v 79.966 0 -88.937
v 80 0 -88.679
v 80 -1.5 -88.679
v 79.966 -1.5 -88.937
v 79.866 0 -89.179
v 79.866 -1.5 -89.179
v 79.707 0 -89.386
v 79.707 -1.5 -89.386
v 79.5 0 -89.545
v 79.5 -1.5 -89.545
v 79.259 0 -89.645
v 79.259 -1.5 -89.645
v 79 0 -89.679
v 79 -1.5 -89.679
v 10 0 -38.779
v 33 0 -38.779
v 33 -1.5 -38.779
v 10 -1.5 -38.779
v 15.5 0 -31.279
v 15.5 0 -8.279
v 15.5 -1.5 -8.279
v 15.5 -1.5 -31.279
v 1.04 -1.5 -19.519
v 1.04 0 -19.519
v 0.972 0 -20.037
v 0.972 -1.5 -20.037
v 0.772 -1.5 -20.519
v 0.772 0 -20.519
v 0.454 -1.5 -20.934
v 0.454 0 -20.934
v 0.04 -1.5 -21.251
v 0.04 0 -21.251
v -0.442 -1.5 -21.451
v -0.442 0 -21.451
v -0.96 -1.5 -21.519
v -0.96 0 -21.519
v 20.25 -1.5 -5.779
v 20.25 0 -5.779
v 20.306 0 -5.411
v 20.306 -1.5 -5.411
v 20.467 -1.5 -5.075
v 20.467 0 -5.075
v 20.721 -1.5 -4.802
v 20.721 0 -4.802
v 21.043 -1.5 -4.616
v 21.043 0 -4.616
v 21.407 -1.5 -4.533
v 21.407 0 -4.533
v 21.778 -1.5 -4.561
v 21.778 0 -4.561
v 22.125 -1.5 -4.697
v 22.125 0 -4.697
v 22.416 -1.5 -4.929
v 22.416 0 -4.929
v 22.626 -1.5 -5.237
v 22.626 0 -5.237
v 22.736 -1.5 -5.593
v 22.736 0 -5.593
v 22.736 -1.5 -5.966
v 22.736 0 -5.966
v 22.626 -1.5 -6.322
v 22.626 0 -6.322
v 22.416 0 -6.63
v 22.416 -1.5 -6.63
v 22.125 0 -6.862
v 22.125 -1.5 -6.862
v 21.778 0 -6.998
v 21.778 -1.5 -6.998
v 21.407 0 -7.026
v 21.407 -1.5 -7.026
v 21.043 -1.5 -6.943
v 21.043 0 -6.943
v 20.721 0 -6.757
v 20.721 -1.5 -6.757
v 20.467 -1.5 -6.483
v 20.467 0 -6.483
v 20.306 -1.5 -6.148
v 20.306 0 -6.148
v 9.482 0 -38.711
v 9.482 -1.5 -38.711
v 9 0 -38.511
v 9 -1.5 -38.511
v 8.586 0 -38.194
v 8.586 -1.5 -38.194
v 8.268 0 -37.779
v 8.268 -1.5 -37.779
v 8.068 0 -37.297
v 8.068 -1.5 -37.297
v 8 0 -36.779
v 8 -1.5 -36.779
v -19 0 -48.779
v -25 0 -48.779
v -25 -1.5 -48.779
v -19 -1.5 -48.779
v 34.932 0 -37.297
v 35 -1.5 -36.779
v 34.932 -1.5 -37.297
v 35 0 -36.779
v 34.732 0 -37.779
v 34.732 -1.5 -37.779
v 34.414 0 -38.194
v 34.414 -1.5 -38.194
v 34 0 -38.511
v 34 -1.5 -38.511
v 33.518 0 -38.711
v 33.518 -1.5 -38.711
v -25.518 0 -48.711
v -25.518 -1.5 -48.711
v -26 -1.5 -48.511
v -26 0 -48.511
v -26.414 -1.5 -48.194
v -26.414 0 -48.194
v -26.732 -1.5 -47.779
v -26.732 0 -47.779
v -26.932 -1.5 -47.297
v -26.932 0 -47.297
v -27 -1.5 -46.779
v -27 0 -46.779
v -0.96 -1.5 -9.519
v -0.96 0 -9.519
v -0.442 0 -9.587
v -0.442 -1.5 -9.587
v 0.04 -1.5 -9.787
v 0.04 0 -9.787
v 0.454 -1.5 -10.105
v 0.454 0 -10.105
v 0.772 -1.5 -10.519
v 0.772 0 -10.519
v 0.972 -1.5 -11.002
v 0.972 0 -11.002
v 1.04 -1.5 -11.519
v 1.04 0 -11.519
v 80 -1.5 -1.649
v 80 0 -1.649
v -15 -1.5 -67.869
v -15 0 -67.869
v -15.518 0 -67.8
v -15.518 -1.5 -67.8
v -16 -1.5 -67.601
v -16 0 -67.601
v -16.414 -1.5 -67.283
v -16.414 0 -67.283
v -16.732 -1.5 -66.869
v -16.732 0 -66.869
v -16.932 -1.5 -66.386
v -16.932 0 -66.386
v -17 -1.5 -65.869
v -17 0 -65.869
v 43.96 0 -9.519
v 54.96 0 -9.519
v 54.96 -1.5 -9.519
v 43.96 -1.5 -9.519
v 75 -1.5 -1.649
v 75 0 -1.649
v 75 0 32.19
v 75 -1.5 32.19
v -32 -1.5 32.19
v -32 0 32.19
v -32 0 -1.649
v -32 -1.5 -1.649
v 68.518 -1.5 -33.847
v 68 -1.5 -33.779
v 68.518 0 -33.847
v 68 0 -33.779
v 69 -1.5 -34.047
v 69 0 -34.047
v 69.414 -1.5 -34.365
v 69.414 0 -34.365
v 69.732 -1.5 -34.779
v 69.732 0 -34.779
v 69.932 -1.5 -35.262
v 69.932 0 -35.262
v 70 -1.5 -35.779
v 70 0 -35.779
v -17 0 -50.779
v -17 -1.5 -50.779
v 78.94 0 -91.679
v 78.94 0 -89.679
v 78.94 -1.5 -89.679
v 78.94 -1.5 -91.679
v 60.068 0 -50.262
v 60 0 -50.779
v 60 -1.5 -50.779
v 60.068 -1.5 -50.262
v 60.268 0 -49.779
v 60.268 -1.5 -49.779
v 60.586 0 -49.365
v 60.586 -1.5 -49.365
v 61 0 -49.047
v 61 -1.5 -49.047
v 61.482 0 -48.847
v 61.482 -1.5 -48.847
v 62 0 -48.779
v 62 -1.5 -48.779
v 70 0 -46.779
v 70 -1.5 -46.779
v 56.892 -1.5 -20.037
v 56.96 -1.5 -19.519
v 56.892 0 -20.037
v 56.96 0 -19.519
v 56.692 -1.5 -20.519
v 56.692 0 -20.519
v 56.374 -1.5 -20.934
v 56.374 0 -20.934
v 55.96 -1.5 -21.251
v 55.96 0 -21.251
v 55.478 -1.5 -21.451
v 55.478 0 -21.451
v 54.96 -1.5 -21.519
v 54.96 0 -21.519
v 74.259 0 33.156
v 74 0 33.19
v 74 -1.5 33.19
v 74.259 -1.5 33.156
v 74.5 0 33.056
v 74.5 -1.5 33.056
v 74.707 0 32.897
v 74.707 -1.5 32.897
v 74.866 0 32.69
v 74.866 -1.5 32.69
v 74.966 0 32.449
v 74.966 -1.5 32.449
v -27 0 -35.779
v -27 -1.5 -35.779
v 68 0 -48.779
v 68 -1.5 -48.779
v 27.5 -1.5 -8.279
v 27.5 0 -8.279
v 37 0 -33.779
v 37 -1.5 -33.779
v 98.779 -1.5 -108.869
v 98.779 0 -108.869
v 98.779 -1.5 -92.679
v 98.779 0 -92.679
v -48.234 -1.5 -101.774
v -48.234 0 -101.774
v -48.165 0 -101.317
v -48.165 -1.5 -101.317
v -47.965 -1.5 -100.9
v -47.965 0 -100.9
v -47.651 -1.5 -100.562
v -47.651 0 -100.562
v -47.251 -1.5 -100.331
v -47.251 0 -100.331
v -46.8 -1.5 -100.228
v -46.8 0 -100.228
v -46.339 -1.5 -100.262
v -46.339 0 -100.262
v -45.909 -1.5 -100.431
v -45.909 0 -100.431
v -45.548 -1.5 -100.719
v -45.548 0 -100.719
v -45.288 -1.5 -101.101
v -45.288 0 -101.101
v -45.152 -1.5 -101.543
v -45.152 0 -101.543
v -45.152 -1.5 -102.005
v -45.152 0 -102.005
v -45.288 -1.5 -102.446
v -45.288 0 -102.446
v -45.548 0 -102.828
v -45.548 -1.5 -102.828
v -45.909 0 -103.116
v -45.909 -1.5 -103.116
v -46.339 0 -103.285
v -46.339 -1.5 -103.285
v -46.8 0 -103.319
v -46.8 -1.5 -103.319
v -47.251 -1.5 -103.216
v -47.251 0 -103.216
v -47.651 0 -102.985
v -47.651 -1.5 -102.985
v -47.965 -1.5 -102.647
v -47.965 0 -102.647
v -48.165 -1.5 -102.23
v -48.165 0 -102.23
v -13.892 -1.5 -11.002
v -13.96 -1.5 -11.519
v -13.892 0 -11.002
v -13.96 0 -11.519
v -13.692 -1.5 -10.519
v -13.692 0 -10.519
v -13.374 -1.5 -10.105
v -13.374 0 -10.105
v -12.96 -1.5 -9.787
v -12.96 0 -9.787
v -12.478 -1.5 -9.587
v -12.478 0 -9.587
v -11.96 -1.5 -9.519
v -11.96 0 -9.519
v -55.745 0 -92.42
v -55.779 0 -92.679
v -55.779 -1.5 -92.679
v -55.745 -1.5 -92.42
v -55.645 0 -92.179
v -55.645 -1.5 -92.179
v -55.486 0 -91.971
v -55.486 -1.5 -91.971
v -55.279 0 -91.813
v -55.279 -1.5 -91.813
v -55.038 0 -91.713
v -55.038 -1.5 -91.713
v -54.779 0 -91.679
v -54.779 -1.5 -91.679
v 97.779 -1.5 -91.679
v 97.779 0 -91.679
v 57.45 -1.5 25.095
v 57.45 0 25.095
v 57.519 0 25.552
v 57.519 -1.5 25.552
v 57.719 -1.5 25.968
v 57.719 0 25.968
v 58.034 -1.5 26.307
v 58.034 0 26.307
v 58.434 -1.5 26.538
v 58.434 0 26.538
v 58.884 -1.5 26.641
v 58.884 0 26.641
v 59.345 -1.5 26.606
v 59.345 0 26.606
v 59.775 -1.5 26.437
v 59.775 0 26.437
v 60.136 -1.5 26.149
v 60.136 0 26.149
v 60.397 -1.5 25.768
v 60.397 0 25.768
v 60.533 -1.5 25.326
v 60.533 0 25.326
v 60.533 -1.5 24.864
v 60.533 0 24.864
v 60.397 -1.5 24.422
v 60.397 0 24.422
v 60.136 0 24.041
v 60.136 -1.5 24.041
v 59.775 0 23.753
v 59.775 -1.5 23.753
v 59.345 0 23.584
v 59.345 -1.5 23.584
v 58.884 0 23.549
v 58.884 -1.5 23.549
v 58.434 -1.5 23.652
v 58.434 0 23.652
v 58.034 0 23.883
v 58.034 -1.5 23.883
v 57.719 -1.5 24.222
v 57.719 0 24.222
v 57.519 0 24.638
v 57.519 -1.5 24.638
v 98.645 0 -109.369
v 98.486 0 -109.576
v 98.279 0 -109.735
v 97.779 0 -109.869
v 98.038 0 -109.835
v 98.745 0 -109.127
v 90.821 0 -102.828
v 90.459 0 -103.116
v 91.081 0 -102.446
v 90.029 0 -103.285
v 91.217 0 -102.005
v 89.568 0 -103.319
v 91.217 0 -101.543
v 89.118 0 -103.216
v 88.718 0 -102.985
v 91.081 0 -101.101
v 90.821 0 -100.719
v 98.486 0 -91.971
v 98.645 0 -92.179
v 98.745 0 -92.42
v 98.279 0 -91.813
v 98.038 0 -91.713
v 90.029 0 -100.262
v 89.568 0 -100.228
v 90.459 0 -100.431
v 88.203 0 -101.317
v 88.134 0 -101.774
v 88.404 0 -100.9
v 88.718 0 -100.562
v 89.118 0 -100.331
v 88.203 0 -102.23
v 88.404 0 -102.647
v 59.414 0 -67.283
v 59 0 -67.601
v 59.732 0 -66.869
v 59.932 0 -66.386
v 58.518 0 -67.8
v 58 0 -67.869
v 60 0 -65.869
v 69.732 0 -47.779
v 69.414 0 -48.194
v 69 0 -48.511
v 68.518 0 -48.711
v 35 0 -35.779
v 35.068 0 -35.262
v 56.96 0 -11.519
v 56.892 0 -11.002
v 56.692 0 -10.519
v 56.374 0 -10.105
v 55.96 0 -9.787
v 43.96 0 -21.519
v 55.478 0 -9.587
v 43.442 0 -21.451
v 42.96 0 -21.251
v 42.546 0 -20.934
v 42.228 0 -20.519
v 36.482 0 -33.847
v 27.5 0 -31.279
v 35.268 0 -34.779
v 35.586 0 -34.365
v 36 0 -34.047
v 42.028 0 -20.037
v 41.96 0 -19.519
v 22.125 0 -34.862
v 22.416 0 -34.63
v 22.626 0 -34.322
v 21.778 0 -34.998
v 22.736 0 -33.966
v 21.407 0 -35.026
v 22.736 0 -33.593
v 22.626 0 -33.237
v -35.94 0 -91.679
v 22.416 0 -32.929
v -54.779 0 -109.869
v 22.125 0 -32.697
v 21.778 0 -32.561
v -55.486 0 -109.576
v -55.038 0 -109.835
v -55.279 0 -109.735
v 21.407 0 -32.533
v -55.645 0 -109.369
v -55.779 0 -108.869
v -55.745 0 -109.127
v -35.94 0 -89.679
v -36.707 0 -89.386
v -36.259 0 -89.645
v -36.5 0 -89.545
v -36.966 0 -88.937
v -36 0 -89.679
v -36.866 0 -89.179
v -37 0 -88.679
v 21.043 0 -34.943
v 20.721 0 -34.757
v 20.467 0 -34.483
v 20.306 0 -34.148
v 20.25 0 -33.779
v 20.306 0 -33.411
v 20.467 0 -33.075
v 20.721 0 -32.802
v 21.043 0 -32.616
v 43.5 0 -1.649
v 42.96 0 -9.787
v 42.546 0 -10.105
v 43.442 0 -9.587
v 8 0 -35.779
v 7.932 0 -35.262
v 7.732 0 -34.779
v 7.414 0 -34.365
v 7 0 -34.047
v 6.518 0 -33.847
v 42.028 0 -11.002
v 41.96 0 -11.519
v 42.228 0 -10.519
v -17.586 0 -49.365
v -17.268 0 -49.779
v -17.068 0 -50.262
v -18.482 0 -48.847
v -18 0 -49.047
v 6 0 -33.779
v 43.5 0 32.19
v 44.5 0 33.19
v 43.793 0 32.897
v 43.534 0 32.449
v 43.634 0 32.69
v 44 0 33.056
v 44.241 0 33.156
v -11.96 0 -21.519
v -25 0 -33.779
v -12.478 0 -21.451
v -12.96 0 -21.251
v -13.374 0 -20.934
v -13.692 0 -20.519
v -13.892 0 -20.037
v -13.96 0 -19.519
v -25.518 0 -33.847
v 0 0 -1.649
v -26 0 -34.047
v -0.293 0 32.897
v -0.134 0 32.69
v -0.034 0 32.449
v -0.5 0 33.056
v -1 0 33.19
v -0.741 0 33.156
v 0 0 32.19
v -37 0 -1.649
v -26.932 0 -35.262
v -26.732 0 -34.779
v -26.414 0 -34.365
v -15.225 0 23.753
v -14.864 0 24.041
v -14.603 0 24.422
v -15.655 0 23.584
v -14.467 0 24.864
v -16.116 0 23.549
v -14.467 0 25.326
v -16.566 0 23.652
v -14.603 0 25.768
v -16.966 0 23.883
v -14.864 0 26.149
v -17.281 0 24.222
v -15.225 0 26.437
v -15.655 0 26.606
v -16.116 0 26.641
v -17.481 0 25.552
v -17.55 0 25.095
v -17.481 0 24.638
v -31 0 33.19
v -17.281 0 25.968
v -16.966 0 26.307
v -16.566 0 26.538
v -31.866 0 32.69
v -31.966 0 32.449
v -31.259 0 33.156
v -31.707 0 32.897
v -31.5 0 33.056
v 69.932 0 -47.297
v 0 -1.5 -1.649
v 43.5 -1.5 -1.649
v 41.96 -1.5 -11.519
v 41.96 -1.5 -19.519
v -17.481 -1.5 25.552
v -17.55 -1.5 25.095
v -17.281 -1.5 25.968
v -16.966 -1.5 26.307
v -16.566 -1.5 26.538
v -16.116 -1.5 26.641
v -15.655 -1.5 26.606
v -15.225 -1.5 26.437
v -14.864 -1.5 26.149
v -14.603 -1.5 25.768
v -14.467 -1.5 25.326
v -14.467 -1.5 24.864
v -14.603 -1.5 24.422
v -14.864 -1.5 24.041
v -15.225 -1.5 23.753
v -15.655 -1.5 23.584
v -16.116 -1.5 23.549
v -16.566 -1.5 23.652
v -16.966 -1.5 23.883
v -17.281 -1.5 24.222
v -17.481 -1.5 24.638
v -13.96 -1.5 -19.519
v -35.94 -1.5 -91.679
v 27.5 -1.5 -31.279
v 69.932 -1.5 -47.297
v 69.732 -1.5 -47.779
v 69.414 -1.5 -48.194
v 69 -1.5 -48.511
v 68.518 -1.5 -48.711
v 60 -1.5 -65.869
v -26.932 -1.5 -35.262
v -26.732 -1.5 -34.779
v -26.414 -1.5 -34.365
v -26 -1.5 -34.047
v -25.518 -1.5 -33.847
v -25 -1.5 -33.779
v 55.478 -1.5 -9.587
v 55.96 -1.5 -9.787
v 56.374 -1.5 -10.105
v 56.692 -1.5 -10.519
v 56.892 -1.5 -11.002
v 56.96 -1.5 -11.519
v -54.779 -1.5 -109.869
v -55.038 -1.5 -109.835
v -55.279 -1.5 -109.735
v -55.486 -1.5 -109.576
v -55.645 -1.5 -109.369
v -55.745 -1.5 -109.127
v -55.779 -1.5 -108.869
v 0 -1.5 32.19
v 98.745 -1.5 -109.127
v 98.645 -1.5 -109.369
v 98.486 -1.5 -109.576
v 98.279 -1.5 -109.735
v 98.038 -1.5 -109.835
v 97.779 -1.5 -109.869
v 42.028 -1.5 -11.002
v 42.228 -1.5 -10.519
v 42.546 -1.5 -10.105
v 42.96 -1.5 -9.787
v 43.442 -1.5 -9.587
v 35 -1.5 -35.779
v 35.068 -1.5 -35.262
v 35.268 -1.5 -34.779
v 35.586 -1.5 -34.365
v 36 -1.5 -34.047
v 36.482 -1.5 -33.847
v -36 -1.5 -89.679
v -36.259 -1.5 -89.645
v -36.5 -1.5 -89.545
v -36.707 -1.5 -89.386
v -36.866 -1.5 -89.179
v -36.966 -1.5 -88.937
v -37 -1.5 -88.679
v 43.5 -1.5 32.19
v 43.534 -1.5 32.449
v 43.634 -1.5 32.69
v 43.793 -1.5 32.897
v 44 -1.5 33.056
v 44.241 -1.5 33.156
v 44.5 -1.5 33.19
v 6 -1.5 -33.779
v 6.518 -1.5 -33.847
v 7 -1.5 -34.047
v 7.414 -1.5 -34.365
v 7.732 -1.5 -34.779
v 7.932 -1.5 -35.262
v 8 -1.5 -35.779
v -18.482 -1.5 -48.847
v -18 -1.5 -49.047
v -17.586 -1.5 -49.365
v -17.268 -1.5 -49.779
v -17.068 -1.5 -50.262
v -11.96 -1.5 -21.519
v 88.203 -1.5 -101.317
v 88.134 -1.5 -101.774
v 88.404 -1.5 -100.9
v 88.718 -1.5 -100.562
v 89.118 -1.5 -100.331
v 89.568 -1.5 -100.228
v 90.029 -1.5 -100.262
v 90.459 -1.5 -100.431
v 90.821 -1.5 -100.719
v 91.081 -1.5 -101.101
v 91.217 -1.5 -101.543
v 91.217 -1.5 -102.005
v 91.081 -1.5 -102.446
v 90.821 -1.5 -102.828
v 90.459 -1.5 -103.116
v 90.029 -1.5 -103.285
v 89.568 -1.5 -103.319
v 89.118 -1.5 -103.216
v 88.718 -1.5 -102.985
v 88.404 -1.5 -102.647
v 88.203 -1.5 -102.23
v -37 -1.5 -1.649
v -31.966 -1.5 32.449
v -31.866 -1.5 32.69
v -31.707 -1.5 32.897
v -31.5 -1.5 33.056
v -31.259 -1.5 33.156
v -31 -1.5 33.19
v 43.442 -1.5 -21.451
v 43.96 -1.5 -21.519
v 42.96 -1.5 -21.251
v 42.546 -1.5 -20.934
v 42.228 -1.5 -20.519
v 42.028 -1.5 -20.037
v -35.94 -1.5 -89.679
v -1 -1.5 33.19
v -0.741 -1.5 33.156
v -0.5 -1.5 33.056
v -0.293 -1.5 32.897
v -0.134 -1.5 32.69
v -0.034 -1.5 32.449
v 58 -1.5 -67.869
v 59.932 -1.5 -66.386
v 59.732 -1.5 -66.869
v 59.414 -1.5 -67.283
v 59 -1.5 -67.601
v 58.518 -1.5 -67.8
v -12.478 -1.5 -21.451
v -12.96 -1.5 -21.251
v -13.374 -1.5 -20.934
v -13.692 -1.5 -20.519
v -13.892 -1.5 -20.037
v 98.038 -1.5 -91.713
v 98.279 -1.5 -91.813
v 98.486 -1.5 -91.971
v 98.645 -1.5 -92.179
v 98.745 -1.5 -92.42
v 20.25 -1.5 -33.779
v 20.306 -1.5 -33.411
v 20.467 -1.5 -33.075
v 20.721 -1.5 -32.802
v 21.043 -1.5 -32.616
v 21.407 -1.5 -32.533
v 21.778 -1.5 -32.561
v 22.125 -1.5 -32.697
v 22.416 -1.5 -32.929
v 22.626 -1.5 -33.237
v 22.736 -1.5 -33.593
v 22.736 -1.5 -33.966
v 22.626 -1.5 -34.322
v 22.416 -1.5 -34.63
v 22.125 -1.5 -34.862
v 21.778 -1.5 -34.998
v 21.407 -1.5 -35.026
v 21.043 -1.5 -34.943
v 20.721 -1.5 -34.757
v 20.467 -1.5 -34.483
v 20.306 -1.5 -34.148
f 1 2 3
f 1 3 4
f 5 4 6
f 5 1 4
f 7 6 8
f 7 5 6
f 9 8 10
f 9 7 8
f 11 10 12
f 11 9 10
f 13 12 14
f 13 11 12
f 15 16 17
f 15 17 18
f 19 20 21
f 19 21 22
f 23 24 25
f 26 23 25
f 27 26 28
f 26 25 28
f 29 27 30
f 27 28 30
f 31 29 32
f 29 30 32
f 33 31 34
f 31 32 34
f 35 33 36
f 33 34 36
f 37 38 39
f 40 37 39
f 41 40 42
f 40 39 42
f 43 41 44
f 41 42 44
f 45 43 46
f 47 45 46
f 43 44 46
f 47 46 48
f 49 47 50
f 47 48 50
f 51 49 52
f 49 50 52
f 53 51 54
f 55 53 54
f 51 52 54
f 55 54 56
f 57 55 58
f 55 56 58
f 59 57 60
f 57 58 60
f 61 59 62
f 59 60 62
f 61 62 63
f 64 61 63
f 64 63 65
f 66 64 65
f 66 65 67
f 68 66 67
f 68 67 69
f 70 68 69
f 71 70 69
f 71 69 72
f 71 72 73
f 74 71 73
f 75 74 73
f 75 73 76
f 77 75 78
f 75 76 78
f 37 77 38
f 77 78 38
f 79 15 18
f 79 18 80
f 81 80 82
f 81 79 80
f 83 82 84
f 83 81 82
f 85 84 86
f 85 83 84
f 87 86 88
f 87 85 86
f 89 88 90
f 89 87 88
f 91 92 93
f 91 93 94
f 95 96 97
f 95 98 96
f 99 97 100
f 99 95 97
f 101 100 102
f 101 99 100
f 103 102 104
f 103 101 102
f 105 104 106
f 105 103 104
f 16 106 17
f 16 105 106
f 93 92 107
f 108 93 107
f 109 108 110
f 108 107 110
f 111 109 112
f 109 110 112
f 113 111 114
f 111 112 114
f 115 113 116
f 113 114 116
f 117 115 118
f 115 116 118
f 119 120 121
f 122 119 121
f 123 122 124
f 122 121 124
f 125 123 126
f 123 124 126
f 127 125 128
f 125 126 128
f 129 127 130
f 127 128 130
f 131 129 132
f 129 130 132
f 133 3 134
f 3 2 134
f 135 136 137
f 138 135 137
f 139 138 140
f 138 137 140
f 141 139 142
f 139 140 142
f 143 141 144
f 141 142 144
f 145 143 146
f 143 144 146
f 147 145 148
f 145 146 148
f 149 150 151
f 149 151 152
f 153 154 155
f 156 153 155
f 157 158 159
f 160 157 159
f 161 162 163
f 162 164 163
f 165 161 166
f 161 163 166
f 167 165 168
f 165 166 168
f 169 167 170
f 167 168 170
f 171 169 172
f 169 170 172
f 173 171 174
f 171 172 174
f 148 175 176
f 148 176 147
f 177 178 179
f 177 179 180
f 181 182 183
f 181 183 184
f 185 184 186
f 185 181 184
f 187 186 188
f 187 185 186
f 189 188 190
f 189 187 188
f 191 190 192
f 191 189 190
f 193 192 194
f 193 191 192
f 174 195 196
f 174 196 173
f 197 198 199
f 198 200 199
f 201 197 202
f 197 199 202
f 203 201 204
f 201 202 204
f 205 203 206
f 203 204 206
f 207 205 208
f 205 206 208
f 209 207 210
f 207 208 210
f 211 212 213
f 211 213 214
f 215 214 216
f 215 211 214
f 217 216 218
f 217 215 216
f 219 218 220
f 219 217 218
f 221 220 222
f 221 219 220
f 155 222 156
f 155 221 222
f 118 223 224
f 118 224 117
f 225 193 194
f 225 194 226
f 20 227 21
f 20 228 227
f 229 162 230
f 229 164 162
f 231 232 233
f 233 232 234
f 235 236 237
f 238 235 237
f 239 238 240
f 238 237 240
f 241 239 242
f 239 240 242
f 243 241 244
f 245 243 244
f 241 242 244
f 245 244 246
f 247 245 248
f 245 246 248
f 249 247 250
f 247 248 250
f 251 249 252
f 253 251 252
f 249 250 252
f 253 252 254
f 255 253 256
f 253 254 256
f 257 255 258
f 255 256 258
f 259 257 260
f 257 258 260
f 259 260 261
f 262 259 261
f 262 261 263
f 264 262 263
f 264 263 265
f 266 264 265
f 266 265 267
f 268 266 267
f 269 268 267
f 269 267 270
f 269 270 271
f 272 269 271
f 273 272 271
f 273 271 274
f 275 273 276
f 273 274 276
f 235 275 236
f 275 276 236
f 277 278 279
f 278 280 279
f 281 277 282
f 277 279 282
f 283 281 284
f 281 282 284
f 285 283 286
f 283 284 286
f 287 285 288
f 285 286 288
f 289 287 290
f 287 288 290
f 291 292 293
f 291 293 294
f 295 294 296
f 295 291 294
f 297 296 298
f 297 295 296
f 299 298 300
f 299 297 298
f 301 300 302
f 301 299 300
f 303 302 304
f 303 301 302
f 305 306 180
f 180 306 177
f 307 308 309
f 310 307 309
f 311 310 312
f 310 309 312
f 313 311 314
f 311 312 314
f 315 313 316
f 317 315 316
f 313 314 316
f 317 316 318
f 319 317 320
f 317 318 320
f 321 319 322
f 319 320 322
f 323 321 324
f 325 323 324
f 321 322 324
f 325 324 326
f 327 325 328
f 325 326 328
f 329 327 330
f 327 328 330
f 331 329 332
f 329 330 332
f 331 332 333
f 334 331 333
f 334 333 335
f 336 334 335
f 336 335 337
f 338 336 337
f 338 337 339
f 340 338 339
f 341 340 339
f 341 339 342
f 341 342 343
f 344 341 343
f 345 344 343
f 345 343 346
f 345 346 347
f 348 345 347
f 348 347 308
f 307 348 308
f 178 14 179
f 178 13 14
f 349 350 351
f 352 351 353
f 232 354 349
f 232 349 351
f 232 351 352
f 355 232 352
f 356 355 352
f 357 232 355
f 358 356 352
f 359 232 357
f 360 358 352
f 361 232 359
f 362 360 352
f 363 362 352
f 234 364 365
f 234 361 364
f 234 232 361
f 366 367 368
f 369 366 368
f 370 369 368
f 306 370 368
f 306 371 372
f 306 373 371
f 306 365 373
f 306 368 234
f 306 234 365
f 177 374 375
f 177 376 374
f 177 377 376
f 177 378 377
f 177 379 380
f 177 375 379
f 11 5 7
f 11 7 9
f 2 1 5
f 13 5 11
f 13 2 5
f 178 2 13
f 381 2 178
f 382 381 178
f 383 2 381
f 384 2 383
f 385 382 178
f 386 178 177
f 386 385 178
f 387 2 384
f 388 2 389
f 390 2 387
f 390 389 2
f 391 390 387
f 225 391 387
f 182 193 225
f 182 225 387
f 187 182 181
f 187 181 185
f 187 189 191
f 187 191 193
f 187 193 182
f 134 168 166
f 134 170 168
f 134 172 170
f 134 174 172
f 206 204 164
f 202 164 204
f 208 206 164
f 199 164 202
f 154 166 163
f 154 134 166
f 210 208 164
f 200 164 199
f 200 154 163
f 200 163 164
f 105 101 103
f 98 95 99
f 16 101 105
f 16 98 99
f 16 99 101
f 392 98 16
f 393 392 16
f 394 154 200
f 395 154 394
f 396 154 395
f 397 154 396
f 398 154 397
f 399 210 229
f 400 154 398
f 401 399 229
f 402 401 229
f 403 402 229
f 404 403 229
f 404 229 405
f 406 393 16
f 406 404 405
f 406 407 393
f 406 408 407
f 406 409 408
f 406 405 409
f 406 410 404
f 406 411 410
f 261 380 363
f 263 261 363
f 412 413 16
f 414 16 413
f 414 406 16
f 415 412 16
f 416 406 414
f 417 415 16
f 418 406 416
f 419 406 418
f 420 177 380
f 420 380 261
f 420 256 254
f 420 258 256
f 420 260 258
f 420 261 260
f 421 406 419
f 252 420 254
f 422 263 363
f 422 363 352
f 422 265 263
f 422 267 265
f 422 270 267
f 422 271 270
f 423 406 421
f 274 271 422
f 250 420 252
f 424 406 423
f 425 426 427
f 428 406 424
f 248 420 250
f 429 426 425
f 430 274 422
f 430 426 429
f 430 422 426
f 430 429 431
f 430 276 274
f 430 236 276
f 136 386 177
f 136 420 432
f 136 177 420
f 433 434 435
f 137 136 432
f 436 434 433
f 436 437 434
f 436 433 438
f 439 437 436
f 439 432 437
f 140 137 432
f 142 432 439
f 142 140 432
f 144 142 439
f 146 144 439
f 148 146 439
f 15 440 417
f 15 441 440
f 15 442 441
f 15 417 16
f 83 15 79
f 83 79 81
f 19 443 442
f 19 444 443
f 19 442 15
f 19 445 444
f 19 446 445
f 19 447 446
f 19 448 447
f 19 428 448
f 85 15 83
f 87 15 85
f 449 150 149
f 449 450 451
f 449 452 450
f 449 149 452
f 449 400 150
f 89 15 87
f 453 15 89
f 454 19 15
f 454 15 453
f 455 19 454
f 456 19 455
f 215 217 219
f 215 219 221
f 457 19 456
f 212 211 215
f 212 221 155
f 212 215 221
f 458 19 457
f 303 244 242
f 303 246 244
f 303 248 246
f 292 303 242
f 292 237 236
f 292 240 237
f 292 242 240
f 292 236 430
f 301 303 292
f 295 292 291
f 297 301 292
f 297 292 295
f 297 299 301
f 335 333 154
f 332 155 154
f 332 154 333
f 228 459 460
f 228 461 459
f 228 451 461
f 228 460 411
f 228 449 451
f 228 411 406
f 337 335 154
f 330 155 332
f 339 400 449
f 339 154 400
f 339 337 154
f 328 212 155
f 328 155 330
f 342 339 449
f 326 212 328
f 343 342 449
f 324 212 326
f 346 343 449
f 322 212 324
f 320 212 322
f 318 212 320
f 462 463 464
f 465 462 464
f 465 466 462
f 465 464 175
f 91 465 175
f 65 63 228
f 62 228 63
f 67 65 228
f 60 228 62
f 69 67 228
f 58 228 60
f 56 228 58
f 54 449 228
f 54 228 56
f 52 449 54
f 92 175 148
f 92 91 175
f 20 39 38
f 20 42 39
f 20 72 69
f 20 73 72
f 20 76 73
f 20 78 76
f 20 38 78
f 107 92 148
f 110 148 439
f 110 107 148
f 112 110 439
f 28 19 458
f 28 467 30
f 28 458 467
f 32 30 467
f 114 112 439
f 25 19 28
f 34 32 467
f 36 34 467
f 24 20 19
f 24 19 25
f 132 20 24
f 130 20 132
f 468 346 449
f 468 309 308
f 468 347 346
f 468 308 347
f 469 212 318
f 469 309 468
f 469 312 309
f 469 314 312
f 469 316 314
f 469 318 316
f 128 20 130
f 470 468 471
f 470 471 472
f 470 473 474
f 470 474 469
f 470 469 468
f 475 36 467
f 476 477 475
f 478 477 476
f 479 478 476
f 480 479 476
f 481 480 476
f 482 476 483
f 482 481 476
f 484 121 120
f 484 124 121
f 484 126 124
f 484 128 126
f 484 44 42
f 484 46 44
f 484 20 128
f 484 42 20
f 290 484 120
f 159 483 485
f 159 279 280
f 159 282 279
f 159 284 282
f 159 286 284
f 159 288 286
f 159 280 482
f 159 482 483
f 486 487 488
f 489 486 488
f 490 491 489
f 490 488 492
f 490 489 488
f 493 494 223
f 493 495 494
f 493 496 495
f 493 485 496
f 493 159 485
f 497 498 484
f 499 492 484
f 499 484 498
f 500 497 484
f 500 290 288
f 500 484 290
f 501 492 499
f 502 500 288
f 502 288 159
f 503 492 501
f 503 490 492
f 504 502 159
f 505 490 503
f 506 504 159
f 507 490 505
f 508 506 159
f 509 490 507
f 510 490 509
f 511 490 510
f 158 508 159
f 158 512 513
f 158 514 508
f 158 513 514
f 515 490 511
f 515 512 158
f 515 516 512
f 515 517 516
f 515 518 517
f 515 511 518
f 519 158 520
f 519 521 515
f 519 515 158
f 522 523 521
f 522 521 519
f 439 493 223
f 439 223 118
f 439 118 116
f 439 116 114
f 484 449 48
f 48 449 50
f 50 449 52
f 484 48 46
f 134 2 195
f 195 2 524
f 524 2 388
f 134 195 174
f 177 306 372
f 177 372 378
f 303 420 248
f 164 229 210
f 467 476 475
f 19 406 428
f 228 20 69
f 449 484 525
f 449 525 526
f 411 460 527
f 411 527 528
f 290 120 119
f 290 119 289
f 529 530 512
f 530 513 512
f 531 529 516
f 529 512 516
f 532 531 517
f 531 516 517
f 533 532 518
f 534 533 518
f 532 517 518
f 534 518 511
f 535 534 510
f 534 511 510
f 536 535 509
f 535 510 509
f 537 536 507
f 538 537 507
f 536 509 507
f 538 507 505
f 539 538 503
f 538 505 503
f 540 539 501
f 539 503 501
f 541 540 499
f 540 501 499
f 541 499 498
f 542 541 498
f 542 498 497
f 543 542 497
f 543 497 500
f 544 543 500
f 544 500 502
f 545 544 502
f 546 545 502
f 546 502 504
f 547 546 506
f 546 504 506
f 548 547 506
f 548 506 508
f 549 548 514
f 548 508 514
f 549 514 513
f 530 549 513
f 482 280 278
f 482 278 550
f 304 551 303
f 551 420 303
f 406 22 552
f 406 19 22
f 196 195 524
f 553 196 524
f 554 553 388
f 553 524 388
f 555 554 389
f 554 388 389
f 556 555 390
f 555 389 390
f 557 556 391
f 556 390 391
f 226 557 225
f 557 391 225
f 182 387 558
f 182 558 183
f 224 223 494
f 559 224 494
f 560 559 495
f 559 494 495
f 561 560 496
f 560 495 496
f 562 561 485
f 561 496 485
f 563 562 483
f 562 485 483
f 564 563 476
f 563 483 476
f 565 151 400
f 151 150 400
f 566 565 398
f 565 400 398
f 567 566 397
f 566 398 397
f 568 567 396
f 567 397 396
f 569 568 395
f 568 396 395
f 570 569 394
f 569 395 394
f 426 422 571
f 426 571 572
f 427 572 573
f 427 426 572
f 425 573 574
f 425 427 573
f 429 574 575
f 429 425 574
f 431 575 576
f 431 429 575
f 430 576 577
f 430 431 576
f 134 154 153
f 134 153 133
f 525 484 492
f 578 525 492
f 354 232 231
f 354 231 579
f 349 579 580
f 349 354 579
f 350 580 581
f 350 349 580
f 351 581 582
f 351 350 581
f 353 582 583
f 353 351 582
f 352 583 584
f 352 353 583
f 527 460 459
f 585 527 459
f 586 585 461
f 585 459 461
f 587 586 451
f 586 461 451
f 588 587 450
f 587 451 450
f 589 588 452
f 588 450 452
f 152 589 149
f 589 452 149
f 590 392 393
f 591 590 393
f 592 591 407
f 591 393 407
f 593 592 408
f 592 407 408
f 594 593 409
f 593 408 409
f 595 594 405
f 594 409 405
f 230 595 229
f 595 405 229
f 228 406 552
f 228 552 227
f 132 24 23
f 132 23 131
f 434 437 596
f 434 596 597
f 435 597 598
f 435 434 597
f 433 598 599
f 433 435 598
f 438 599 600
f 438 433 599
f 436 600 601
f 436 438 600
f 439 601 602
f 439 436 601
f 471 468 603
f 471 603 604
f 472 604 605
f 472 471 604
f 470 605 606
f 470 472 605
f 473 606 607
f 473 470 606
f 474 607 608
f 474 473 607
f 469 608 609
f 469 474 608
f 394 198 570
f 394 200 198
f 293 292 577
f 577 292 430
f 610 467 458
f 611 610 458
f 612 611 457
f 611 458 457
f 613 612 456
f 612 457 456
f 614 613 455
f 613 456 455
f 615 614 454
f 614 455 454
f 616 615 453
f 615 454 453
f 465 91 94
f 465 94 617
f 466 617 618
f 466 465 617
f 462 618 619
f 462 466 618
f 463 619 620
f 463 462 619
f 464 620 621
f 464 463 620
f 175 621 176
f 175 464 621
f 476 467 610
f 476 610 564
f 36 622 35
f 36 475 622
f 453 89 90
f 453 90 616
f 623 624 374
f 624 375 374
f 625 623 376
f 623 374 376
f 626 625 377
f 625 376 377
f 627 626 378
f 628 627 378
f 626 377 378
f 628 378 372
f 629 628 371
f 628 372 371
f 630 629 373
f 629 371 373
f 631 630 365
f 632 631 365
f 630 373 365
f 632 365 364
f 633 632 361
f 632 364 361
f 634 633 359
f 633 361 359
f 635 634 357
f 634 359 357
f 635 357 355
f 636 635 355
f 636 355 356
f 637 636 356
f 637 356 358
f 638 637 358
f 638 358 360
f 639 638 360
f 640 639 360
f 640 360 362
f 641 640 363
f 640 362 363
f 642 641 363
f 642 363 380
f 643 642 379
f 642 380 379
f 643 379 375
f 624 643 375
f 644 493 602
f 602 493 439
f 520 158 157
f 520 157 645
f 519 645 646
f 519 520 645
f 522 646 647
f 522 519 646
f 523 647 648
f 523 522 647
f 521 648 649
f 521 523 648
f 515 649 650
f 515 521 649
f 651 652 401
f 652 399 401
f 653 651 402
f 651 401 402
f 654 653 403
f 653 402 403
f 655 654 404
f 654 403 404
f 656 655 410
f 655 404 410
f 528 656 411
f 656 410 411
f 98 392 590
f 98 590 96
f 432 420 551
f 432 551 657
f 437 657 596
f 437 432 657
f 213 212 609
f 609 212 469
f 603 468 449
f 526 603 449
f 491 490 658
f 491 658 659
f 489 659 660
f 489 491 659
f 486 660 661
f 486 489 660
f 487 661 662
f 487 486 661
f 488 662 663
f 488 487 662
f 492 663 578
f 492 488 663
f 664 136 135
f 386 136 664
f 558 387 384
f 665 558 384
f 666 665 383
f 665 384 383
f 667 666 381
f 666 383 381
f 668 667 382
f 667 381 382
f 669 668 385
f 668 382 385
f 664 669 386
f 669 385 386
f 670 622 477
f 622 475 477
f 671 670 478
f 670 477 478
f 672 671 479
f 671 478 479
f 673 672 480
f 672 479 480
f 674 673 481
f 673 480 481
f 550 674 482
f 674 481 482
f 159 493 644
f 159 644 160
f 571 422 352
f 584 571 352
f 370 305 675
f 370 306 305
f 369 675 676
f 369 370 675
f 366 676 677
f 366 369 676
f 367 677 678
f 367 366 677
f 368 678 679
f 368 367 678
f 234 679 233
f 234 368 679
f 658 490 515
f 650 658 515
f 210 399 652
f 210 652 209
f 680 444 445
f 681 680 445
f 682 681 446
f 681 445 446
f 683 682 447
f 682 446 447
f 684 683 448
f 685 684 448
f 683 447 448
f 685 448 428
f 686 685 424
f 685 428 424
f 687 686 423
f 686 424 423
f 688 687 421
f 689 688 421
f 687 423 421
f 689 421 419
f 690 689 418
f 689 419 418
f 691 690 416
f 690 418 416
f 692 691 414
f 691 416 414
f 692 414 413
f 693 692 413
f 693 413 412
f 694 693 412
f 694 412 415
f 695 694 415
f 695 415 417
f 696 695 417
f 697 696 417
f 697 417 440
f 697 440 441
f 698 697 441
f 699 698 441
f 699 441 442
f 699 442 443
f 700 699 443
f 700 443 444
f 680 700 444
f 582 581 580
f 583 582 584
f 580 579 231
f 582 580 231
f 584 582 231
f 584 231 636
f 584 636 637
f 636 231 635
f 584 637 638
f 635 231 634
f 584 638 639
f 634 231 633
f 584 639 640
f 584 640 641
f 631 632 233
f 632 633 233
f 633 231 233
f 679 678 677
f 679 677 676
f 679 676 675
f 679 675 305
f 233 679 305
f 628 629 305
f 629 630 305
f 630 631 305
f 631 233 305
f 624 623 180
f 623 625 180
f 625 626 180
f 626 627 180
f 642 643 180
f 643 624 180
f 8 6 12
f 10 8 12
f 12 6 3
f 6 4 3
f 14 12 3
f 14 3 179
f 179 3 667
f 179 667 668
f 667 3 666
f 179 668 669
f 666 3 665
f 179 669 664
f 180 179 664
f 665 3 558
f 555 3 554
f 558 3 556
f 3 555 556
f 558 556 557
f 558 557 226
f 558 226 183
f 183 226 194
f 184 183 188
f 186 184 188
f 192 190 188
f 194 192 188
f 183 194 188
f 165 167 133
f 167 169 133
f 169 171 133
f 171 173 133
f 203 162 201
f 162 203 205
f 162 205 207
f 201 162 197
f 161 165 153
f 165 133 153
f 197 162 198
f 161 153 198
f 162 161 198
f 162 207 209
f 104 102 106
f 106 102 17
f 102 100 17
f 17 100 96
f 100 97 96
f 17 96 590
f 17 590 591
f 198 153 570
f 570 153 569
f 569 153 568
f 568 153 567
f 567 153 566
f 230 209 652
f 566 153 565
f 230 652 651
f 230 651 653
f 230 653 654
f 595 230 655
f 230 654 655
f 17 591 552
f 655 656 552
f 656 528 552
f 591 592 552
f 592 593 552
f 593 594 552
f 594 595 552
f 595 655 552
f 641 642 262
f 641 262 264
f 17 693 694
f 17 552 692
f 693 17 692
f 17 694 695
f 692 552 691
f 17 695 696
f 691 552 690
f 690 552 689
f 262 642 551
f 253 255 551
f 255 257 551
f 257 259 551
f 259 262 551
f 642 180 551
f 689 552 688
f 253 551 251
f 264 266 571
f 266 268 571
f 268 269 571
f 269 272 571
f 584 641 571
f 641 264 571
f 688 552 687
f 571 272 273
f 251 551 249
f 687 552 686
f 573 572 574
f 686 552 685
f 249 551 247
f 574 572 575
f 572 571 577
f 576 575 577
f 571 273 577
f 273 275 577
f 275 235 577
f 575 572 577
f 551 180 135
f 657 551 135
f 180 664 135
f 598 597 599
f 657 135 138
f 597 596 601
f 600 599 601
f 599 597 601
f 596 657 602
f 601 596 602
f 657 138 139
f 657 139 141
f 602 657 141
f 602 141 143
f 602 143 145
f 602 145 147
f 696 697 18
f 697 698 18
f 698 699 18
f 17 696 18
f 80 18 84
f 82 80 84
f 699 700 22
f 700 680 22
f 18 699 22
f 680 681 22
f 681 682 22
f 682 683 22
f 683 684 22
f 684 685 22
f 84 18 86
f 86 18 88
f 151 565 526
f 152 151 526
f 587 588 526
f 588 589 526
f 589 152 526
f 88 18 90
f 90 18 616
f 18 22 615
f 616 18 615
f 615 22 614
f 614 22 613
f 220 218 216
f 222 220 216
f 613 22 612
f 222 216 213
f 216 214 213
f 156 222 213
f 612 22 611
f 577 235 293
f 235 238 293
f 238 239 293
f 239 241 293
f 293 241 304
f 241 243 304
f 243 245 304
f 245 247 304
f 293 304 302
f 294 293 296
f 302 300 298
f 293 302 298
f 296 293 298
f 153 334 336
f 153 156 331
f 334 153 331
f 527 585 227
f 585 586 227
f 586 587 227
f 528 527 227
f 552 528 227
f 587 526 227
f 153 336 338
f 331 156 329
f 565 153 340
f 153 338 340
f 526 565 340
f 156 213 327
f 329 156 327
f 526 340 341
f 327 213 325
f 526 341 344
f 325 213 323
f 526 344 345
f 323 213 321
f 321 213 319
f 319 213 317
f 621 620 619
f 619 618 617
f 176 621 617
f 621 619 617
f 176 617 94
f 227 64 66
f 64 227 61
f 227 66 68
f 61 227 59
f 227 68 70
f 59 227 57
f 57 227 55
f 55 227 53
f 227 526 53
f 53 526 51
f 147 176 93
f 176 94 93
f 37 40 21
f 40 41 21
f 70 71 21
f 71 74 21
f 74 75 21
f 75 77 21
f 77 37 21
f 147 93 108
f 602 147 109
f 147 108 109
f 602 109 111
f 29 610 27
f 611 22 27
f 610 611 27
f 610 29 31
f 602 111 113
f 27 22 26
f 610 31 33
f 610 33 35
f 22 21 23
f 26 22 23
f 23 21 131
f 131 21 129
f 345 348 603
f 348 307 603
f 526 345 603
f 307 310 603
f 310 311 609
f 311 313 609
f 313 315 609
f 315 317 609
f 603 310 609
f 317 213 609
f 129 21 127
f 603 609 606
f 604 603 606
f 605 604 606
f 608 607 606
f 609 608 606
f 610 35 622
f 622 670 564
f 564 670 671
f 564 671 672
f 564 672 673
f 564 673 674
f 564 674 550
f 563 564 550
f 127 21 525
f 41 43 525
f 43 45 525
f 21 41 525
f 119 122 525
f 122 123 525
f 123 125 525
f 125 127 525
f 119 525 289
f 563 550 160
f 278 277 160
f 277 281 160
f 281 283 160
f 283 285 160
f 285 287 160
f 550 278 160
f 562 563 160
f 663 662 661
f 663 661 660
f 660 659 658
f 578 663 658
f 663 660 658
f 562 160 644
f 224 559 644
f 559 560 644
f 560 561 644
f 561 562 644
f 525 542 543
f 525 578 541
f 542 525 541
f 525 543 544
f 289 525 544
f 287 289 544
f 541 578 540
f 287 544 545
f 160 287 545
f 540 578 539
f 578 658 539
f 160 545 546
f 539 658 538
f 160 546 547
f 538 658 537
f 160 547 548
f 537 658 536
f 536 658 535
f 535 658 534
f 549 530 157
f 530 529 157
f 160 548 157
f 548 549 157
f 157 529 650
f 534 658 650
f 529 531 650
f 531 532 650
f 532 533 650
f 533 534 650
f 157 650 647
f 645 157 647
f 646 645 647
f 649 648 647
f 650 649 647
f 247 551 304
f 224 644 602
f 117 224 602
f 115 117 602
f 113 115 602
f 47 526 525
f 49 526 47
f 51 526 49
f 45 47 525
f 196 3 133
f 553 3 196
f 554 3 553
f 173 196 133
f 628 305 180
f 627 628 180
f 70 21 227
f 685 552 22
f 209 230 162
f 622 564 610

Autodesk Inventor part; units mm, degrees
ref_plane "YZ Plane" through (0, 0, 0) normal (1, 0, 0) x (0, 1, 0)
ref_plane "XZ Plane" through (0, 0, 0) normal (0, 1, 0) x (-1, 0, 0)
ref_plane "XY Plane" through (0, 0, 0) normal (0, 0, 1) x (1, 0, 0)
sketch "Sketch1" plane through (0, 0, 0) normal (0, 1, 0) x (-1, 0, 0)
  line L0 (32, -0.4496) -> (0, -0.4496)
  line L1 (-80.1396, -91.6786) -> (-80.1396, -109.8686)
  line L2 (37, -56.2289) -> (-80, -56.2289)
  line L3 (-43.5, -0.4496) -> (-75, -0.4496)
  line L4 (37.1396, -109.8686) -> (37.1396, -91.6786)
  arc A0 (-60, -65.8686) -> (-58, -67.8686) centre (-58, -65.8686) ccw
  line L5 (15, -67.8686) -> (-58, -67.8686)
  arc A1 (15, -67.8686) -> (17, -65.8686) centre (15, -65.8686) ccw
  line L6 (17, -50.7793) -> (17, -65.8686)
  arc A2 (27, -35.7793) -> (25, -33.7793) centre (25, -35.7793) ccw
  line L7 (-6, -33.7793) -> (25, -33.7793)
  arc A3 (-6, -33.7793) -> (-8, -35.7793) centre (-6, -35.7793) ccw
  line L8 (-8, -36.7793) -> (-8, -35.7793)
  arc A4 (-10, -38.7793) -> (-8, -36.7793) centre (-10, -36.7793) ccw
  arc A5 (-35, -36.7793) -> (-33, -38.7793) centre (-33, -36.7793) ccw
  line L9 (-35, -35.7793) -> (-35, -36.7793)
  arc A6 (-35, -35.7793) -> (-37, -33.7793) centre (-37, -35.7793) ccw
  line L10 (-68, -33.7793) -> (-37, -33.7793)
  arc A7 (-68, -33.7793) -> (-70, -35.7793) centre (-68, -35.7793) ccw
  line L11 (-70, -46.7793) -> (-70, -35.7793)
  line L12 (-27.5, -31.2793) -> (-27.5, -8.2793)
  line L13 (-15.5, -31.2793) -> (-27.5, -31.2793)
  line L14 (-15.5, -8.2793) -> (-15.5, -31.2793)
  line L15 (-27.5, -8.2793) -> (-15.5, -8.2793)
  circle A8 centre (-21.5, -5.7793) radius 1.25
  circle A9 centre (-21.5, -33.7793) radius 1.25
  arc A10 (-1.04, -19.5193) -> (0.96, -21.5193) centre (0.96, -19.5193) ccw
  line L16 (11.96, -21.5193) -> (0.96, -21.5193)
  arc A11 (0.96, -9.5193) -> (-1.04, -11.5193) centre (0.96, -11.5193) ccw
  line L17 (-1.04, -19.5193) -> (-1.04, -11.5193)
  arc A12 (11.96, -21.5193) -> (13.96, -19.5193) centre (11.96, -19.5193) ccw
  line L18 (13.96, -11.5193) -> (13.96, -19.5193)
  arc A13 (13.96, -11.5193) -> (11.96, -9.5193) centre (11.96, -11.5193) ccw
  line L19 (0.96, -9.5193) -> (11.96, -9.5193)
  arc A14 (-43.96, -21.5193) -> (-41.96, -19.5193) centre (-43.96, -19.5193) ccw
  line L20 (-41.96, -11.5193) -> (-41.96, -19.5193)
  arc A15 (-56.96, -19.5193) -> (-54.96, -21.5193) centre (-54.96, -19.5193) ccw
  line L21 (-43.96, -21.5193) -> (-54.96, -21.5193)
  arc A16 (-41.96, -11.5193) -> (-43.96, -9.5193) centre (-43.96, -11.5193) ccw
  line L22 (-54.96, -9.5193) -> (-43.96, -9.5193)
  arc A17 (-54.96, -9.5193) -> (-56.96, -11.5193) centre (-54.96, -11.5193) ccw
  line L23 (-56.96, -19.5193) -> (-56.96, -11.5193)
  arc A18 (25, -48.7793) -> (27, -46.7793) centre (25, -46.7793) ccw
  line L24 (27, -35.7793) -> (27, -46.7793)
  arc A19 (19, -48.7793) -> (17, -50.7793) centre (19, -50.7793) ccw
  arc A20 (-60, -50.7793) -> (-62, -48.7793) centre (-62, -50.7793) ccw
  line L25 (-60, -65.8686) -> (-60, -50.7793)
  arc A21 (-70, -46.7793) -> (-68, -48.7793) centre (-68, -46.7793) ccw
  line L26 (-62, -48.7793) -> (-68, -48.7793)
  line L27 (25, -48.7793) -> (19, -48.7793)
  line L28 (-33, -38.7793) -> (-10, -38.7793)
  circle A22 centre (-59, 25.095) radius 1.55
  circle A23 centre (16, 25.095) radius 1.55
  circle A24 centre (-89.6843, -101.7736) radius 1.55
  circle A25 centre (46.6843, -101.7736) radius 1.55
  arc A26 (-80, -88.6786) -> (-79, -89.6786) centre (-79, -88.6786) ccw
  arc A27 (36, -89.6786) -> (37, -88.6786) centre (36, -88.6786) ccw
  line L29 (35.94, -89.6786) -> (36, -89.6786)
  arc A28 (55.7793, -92.6786) -> (54.7793, -91.6786) centre (54.7793, -92.6786) ccw
  arc A29 (54.7793, -109.8686) -> (55.7793, -108.8686) centre (54.7793, -108.8686) ccw
  line L30 (54.7793, -109.8686) -> (-97.7793, -109.8686)
  arc A30 (-98.7793, -108.8686) -> (-97.7793, -109.8686) centre (-97.7793, -108.8686) ccw
  arc A31 (-97.7793, -91.6786) -> (-98.7793, -92.6786) centre (-97.7793, -92.6786) ccw
  line L31 (-97.7793, -91.6786) -> (-78.94, -91.6786)
  arc A32 (1, 33.19) -> (0, 32.19) centre (1, 32.19) ccw
  arc A33 (32, 32.19) -> (31, 33.19) centre (31, 32.19) ccw
  arc A34 (-74, 33.19) -> (-75, 32.19) centre (-74, 32.19) ccw
  arc A35 (-43.5, 32.19) -> (-44.5, 33.19) centre (-44.5, 32.19) ccw
  line L32 (-43.5, 32.19) -> (-43.5, -1.6493)
  line L33 (-74, 33.19) -> (-44.5, 33.19)
  line L34 (-75, -1.6493) -> (-75, 32.19)
  line L35 (-75, -1.6493) -> (-80, -1.6493)
  line L36 (-80, -88.6786) -> (-80, -1.6493)
  line L37 (1, 33.19) -> (31, 33.19)
  line L38 (32, 32.19) -> (32, -1.6493)
  line L39 (37, -1.6493) -> (32, -1.6493)
  line L40 (0, -1.6493) -> (0, 32.19)
  line L41 (0, -1.6493) -> (-43.5, -1.6493)
  line L42 (37, -1.6493) -> (37, -88.6786)
  line L43 (-98.7793, -108.8686) -> (-98.7793, -92.6786)
  line L44 (55.7793, -92.6786) -> (55.7793, -108.8686)
  line L45 (35.94, -91.6786) -> (54.7793, -91.6786)
  line L46 (35.94, -91.6786) -> (35.94, -89.6786)
  line L47 (-79, -89.6786) -> (-78.94, -89.6786)
  line L48 (-78.94, -89.6786) -> (-78.94, -91.6786)
  line L49 (-80.5893, -109.8686) -> (-80.5893, -91.6786)
  line L50 (37.5893, -91.6786) -> (37.5893, -109.8686)
  line L51 (-79.69, -91.6786) -> (-79.69, -109.8686)
  line L52 (36.69, -109.8686) -> (36.69, -91.6786)
  line L53 (-75, 0) -> (-43.5, 0)
  line L54 (37, -56.6786) -> (17, -56.6786)
  line L55 (-60, -56.6786) -> (-80, -56.6786)
  line L56 (-43.5, -0.8993) -> (-75, -0.8993)
  line L57 (17, -55.7793) -> (37, -55.7793)
  line L58 (-80, -55.7793) -> (-60, -55.7793)
  line L59 (32, -0.8993) -> (0, -0.8993)
  line L60 (0, 0) -> (32, 0)
  point P0 (0, 0)
extrude "Plate1" add sketch "Sketch1" against normal blind 1.5 contours L38 L59 L40 L0 | L0 L40 L60 L38 | L60 L40 A32 L37 A33 L38 | L38 L39 L42 L57 L6 A19 L27 A18 L24 A2 L7 A3 L8 A4 L28 A5 L9 A6 L10 A7 L11 A21 L26 A20 L25 L58 L36 L35 L34 L56 L32 L41 L40 L59 | L42 L2 L6 L57 | L56 L34 L3 L32 | L42 L54 L6 L2 | L3 L34 L53 L32 | L42 A27 L29 L46 L45 L52 L30 L51 L31 L48 L47 A26 L36 L55 L25 A0 L5 A1 L6 L54 | L53 L34 A34 L33 A35 L32 | L25 L55 L36 L2 | L2 L36 L58 L25 | L45 L4 L30 L52 | L45 L50 L30 L4 | L45 A28 L44 A29 L30 L50 | L30 L1 L31 L51 | L30 L49 L31 L1 | L30 A30 L43 A31 L31 L49
equation "\"d0\" = Thickness"
equation "\"BendReliefWidth\" = Thickness"
equation "\"BendReliefDepth\" = 0.5 * Thickness"
equation "\"CornerReliefSize\" = 4 * Thickness"
equation "\"MinimumRemnant\" = 2 * Thickness"
equation "\"TransitionRadius\" = BendRadius"
equation "\"JacobiRadiusSize\" = BendRadius"
equation "\"GapSize\" = Thickness"
equation "\"Thickness\" = 1.5"
equation "\"BendRadius\" = 0.31"
properties part number "body_top_frame2_cam" material "Aluminum 6061-AHC"
